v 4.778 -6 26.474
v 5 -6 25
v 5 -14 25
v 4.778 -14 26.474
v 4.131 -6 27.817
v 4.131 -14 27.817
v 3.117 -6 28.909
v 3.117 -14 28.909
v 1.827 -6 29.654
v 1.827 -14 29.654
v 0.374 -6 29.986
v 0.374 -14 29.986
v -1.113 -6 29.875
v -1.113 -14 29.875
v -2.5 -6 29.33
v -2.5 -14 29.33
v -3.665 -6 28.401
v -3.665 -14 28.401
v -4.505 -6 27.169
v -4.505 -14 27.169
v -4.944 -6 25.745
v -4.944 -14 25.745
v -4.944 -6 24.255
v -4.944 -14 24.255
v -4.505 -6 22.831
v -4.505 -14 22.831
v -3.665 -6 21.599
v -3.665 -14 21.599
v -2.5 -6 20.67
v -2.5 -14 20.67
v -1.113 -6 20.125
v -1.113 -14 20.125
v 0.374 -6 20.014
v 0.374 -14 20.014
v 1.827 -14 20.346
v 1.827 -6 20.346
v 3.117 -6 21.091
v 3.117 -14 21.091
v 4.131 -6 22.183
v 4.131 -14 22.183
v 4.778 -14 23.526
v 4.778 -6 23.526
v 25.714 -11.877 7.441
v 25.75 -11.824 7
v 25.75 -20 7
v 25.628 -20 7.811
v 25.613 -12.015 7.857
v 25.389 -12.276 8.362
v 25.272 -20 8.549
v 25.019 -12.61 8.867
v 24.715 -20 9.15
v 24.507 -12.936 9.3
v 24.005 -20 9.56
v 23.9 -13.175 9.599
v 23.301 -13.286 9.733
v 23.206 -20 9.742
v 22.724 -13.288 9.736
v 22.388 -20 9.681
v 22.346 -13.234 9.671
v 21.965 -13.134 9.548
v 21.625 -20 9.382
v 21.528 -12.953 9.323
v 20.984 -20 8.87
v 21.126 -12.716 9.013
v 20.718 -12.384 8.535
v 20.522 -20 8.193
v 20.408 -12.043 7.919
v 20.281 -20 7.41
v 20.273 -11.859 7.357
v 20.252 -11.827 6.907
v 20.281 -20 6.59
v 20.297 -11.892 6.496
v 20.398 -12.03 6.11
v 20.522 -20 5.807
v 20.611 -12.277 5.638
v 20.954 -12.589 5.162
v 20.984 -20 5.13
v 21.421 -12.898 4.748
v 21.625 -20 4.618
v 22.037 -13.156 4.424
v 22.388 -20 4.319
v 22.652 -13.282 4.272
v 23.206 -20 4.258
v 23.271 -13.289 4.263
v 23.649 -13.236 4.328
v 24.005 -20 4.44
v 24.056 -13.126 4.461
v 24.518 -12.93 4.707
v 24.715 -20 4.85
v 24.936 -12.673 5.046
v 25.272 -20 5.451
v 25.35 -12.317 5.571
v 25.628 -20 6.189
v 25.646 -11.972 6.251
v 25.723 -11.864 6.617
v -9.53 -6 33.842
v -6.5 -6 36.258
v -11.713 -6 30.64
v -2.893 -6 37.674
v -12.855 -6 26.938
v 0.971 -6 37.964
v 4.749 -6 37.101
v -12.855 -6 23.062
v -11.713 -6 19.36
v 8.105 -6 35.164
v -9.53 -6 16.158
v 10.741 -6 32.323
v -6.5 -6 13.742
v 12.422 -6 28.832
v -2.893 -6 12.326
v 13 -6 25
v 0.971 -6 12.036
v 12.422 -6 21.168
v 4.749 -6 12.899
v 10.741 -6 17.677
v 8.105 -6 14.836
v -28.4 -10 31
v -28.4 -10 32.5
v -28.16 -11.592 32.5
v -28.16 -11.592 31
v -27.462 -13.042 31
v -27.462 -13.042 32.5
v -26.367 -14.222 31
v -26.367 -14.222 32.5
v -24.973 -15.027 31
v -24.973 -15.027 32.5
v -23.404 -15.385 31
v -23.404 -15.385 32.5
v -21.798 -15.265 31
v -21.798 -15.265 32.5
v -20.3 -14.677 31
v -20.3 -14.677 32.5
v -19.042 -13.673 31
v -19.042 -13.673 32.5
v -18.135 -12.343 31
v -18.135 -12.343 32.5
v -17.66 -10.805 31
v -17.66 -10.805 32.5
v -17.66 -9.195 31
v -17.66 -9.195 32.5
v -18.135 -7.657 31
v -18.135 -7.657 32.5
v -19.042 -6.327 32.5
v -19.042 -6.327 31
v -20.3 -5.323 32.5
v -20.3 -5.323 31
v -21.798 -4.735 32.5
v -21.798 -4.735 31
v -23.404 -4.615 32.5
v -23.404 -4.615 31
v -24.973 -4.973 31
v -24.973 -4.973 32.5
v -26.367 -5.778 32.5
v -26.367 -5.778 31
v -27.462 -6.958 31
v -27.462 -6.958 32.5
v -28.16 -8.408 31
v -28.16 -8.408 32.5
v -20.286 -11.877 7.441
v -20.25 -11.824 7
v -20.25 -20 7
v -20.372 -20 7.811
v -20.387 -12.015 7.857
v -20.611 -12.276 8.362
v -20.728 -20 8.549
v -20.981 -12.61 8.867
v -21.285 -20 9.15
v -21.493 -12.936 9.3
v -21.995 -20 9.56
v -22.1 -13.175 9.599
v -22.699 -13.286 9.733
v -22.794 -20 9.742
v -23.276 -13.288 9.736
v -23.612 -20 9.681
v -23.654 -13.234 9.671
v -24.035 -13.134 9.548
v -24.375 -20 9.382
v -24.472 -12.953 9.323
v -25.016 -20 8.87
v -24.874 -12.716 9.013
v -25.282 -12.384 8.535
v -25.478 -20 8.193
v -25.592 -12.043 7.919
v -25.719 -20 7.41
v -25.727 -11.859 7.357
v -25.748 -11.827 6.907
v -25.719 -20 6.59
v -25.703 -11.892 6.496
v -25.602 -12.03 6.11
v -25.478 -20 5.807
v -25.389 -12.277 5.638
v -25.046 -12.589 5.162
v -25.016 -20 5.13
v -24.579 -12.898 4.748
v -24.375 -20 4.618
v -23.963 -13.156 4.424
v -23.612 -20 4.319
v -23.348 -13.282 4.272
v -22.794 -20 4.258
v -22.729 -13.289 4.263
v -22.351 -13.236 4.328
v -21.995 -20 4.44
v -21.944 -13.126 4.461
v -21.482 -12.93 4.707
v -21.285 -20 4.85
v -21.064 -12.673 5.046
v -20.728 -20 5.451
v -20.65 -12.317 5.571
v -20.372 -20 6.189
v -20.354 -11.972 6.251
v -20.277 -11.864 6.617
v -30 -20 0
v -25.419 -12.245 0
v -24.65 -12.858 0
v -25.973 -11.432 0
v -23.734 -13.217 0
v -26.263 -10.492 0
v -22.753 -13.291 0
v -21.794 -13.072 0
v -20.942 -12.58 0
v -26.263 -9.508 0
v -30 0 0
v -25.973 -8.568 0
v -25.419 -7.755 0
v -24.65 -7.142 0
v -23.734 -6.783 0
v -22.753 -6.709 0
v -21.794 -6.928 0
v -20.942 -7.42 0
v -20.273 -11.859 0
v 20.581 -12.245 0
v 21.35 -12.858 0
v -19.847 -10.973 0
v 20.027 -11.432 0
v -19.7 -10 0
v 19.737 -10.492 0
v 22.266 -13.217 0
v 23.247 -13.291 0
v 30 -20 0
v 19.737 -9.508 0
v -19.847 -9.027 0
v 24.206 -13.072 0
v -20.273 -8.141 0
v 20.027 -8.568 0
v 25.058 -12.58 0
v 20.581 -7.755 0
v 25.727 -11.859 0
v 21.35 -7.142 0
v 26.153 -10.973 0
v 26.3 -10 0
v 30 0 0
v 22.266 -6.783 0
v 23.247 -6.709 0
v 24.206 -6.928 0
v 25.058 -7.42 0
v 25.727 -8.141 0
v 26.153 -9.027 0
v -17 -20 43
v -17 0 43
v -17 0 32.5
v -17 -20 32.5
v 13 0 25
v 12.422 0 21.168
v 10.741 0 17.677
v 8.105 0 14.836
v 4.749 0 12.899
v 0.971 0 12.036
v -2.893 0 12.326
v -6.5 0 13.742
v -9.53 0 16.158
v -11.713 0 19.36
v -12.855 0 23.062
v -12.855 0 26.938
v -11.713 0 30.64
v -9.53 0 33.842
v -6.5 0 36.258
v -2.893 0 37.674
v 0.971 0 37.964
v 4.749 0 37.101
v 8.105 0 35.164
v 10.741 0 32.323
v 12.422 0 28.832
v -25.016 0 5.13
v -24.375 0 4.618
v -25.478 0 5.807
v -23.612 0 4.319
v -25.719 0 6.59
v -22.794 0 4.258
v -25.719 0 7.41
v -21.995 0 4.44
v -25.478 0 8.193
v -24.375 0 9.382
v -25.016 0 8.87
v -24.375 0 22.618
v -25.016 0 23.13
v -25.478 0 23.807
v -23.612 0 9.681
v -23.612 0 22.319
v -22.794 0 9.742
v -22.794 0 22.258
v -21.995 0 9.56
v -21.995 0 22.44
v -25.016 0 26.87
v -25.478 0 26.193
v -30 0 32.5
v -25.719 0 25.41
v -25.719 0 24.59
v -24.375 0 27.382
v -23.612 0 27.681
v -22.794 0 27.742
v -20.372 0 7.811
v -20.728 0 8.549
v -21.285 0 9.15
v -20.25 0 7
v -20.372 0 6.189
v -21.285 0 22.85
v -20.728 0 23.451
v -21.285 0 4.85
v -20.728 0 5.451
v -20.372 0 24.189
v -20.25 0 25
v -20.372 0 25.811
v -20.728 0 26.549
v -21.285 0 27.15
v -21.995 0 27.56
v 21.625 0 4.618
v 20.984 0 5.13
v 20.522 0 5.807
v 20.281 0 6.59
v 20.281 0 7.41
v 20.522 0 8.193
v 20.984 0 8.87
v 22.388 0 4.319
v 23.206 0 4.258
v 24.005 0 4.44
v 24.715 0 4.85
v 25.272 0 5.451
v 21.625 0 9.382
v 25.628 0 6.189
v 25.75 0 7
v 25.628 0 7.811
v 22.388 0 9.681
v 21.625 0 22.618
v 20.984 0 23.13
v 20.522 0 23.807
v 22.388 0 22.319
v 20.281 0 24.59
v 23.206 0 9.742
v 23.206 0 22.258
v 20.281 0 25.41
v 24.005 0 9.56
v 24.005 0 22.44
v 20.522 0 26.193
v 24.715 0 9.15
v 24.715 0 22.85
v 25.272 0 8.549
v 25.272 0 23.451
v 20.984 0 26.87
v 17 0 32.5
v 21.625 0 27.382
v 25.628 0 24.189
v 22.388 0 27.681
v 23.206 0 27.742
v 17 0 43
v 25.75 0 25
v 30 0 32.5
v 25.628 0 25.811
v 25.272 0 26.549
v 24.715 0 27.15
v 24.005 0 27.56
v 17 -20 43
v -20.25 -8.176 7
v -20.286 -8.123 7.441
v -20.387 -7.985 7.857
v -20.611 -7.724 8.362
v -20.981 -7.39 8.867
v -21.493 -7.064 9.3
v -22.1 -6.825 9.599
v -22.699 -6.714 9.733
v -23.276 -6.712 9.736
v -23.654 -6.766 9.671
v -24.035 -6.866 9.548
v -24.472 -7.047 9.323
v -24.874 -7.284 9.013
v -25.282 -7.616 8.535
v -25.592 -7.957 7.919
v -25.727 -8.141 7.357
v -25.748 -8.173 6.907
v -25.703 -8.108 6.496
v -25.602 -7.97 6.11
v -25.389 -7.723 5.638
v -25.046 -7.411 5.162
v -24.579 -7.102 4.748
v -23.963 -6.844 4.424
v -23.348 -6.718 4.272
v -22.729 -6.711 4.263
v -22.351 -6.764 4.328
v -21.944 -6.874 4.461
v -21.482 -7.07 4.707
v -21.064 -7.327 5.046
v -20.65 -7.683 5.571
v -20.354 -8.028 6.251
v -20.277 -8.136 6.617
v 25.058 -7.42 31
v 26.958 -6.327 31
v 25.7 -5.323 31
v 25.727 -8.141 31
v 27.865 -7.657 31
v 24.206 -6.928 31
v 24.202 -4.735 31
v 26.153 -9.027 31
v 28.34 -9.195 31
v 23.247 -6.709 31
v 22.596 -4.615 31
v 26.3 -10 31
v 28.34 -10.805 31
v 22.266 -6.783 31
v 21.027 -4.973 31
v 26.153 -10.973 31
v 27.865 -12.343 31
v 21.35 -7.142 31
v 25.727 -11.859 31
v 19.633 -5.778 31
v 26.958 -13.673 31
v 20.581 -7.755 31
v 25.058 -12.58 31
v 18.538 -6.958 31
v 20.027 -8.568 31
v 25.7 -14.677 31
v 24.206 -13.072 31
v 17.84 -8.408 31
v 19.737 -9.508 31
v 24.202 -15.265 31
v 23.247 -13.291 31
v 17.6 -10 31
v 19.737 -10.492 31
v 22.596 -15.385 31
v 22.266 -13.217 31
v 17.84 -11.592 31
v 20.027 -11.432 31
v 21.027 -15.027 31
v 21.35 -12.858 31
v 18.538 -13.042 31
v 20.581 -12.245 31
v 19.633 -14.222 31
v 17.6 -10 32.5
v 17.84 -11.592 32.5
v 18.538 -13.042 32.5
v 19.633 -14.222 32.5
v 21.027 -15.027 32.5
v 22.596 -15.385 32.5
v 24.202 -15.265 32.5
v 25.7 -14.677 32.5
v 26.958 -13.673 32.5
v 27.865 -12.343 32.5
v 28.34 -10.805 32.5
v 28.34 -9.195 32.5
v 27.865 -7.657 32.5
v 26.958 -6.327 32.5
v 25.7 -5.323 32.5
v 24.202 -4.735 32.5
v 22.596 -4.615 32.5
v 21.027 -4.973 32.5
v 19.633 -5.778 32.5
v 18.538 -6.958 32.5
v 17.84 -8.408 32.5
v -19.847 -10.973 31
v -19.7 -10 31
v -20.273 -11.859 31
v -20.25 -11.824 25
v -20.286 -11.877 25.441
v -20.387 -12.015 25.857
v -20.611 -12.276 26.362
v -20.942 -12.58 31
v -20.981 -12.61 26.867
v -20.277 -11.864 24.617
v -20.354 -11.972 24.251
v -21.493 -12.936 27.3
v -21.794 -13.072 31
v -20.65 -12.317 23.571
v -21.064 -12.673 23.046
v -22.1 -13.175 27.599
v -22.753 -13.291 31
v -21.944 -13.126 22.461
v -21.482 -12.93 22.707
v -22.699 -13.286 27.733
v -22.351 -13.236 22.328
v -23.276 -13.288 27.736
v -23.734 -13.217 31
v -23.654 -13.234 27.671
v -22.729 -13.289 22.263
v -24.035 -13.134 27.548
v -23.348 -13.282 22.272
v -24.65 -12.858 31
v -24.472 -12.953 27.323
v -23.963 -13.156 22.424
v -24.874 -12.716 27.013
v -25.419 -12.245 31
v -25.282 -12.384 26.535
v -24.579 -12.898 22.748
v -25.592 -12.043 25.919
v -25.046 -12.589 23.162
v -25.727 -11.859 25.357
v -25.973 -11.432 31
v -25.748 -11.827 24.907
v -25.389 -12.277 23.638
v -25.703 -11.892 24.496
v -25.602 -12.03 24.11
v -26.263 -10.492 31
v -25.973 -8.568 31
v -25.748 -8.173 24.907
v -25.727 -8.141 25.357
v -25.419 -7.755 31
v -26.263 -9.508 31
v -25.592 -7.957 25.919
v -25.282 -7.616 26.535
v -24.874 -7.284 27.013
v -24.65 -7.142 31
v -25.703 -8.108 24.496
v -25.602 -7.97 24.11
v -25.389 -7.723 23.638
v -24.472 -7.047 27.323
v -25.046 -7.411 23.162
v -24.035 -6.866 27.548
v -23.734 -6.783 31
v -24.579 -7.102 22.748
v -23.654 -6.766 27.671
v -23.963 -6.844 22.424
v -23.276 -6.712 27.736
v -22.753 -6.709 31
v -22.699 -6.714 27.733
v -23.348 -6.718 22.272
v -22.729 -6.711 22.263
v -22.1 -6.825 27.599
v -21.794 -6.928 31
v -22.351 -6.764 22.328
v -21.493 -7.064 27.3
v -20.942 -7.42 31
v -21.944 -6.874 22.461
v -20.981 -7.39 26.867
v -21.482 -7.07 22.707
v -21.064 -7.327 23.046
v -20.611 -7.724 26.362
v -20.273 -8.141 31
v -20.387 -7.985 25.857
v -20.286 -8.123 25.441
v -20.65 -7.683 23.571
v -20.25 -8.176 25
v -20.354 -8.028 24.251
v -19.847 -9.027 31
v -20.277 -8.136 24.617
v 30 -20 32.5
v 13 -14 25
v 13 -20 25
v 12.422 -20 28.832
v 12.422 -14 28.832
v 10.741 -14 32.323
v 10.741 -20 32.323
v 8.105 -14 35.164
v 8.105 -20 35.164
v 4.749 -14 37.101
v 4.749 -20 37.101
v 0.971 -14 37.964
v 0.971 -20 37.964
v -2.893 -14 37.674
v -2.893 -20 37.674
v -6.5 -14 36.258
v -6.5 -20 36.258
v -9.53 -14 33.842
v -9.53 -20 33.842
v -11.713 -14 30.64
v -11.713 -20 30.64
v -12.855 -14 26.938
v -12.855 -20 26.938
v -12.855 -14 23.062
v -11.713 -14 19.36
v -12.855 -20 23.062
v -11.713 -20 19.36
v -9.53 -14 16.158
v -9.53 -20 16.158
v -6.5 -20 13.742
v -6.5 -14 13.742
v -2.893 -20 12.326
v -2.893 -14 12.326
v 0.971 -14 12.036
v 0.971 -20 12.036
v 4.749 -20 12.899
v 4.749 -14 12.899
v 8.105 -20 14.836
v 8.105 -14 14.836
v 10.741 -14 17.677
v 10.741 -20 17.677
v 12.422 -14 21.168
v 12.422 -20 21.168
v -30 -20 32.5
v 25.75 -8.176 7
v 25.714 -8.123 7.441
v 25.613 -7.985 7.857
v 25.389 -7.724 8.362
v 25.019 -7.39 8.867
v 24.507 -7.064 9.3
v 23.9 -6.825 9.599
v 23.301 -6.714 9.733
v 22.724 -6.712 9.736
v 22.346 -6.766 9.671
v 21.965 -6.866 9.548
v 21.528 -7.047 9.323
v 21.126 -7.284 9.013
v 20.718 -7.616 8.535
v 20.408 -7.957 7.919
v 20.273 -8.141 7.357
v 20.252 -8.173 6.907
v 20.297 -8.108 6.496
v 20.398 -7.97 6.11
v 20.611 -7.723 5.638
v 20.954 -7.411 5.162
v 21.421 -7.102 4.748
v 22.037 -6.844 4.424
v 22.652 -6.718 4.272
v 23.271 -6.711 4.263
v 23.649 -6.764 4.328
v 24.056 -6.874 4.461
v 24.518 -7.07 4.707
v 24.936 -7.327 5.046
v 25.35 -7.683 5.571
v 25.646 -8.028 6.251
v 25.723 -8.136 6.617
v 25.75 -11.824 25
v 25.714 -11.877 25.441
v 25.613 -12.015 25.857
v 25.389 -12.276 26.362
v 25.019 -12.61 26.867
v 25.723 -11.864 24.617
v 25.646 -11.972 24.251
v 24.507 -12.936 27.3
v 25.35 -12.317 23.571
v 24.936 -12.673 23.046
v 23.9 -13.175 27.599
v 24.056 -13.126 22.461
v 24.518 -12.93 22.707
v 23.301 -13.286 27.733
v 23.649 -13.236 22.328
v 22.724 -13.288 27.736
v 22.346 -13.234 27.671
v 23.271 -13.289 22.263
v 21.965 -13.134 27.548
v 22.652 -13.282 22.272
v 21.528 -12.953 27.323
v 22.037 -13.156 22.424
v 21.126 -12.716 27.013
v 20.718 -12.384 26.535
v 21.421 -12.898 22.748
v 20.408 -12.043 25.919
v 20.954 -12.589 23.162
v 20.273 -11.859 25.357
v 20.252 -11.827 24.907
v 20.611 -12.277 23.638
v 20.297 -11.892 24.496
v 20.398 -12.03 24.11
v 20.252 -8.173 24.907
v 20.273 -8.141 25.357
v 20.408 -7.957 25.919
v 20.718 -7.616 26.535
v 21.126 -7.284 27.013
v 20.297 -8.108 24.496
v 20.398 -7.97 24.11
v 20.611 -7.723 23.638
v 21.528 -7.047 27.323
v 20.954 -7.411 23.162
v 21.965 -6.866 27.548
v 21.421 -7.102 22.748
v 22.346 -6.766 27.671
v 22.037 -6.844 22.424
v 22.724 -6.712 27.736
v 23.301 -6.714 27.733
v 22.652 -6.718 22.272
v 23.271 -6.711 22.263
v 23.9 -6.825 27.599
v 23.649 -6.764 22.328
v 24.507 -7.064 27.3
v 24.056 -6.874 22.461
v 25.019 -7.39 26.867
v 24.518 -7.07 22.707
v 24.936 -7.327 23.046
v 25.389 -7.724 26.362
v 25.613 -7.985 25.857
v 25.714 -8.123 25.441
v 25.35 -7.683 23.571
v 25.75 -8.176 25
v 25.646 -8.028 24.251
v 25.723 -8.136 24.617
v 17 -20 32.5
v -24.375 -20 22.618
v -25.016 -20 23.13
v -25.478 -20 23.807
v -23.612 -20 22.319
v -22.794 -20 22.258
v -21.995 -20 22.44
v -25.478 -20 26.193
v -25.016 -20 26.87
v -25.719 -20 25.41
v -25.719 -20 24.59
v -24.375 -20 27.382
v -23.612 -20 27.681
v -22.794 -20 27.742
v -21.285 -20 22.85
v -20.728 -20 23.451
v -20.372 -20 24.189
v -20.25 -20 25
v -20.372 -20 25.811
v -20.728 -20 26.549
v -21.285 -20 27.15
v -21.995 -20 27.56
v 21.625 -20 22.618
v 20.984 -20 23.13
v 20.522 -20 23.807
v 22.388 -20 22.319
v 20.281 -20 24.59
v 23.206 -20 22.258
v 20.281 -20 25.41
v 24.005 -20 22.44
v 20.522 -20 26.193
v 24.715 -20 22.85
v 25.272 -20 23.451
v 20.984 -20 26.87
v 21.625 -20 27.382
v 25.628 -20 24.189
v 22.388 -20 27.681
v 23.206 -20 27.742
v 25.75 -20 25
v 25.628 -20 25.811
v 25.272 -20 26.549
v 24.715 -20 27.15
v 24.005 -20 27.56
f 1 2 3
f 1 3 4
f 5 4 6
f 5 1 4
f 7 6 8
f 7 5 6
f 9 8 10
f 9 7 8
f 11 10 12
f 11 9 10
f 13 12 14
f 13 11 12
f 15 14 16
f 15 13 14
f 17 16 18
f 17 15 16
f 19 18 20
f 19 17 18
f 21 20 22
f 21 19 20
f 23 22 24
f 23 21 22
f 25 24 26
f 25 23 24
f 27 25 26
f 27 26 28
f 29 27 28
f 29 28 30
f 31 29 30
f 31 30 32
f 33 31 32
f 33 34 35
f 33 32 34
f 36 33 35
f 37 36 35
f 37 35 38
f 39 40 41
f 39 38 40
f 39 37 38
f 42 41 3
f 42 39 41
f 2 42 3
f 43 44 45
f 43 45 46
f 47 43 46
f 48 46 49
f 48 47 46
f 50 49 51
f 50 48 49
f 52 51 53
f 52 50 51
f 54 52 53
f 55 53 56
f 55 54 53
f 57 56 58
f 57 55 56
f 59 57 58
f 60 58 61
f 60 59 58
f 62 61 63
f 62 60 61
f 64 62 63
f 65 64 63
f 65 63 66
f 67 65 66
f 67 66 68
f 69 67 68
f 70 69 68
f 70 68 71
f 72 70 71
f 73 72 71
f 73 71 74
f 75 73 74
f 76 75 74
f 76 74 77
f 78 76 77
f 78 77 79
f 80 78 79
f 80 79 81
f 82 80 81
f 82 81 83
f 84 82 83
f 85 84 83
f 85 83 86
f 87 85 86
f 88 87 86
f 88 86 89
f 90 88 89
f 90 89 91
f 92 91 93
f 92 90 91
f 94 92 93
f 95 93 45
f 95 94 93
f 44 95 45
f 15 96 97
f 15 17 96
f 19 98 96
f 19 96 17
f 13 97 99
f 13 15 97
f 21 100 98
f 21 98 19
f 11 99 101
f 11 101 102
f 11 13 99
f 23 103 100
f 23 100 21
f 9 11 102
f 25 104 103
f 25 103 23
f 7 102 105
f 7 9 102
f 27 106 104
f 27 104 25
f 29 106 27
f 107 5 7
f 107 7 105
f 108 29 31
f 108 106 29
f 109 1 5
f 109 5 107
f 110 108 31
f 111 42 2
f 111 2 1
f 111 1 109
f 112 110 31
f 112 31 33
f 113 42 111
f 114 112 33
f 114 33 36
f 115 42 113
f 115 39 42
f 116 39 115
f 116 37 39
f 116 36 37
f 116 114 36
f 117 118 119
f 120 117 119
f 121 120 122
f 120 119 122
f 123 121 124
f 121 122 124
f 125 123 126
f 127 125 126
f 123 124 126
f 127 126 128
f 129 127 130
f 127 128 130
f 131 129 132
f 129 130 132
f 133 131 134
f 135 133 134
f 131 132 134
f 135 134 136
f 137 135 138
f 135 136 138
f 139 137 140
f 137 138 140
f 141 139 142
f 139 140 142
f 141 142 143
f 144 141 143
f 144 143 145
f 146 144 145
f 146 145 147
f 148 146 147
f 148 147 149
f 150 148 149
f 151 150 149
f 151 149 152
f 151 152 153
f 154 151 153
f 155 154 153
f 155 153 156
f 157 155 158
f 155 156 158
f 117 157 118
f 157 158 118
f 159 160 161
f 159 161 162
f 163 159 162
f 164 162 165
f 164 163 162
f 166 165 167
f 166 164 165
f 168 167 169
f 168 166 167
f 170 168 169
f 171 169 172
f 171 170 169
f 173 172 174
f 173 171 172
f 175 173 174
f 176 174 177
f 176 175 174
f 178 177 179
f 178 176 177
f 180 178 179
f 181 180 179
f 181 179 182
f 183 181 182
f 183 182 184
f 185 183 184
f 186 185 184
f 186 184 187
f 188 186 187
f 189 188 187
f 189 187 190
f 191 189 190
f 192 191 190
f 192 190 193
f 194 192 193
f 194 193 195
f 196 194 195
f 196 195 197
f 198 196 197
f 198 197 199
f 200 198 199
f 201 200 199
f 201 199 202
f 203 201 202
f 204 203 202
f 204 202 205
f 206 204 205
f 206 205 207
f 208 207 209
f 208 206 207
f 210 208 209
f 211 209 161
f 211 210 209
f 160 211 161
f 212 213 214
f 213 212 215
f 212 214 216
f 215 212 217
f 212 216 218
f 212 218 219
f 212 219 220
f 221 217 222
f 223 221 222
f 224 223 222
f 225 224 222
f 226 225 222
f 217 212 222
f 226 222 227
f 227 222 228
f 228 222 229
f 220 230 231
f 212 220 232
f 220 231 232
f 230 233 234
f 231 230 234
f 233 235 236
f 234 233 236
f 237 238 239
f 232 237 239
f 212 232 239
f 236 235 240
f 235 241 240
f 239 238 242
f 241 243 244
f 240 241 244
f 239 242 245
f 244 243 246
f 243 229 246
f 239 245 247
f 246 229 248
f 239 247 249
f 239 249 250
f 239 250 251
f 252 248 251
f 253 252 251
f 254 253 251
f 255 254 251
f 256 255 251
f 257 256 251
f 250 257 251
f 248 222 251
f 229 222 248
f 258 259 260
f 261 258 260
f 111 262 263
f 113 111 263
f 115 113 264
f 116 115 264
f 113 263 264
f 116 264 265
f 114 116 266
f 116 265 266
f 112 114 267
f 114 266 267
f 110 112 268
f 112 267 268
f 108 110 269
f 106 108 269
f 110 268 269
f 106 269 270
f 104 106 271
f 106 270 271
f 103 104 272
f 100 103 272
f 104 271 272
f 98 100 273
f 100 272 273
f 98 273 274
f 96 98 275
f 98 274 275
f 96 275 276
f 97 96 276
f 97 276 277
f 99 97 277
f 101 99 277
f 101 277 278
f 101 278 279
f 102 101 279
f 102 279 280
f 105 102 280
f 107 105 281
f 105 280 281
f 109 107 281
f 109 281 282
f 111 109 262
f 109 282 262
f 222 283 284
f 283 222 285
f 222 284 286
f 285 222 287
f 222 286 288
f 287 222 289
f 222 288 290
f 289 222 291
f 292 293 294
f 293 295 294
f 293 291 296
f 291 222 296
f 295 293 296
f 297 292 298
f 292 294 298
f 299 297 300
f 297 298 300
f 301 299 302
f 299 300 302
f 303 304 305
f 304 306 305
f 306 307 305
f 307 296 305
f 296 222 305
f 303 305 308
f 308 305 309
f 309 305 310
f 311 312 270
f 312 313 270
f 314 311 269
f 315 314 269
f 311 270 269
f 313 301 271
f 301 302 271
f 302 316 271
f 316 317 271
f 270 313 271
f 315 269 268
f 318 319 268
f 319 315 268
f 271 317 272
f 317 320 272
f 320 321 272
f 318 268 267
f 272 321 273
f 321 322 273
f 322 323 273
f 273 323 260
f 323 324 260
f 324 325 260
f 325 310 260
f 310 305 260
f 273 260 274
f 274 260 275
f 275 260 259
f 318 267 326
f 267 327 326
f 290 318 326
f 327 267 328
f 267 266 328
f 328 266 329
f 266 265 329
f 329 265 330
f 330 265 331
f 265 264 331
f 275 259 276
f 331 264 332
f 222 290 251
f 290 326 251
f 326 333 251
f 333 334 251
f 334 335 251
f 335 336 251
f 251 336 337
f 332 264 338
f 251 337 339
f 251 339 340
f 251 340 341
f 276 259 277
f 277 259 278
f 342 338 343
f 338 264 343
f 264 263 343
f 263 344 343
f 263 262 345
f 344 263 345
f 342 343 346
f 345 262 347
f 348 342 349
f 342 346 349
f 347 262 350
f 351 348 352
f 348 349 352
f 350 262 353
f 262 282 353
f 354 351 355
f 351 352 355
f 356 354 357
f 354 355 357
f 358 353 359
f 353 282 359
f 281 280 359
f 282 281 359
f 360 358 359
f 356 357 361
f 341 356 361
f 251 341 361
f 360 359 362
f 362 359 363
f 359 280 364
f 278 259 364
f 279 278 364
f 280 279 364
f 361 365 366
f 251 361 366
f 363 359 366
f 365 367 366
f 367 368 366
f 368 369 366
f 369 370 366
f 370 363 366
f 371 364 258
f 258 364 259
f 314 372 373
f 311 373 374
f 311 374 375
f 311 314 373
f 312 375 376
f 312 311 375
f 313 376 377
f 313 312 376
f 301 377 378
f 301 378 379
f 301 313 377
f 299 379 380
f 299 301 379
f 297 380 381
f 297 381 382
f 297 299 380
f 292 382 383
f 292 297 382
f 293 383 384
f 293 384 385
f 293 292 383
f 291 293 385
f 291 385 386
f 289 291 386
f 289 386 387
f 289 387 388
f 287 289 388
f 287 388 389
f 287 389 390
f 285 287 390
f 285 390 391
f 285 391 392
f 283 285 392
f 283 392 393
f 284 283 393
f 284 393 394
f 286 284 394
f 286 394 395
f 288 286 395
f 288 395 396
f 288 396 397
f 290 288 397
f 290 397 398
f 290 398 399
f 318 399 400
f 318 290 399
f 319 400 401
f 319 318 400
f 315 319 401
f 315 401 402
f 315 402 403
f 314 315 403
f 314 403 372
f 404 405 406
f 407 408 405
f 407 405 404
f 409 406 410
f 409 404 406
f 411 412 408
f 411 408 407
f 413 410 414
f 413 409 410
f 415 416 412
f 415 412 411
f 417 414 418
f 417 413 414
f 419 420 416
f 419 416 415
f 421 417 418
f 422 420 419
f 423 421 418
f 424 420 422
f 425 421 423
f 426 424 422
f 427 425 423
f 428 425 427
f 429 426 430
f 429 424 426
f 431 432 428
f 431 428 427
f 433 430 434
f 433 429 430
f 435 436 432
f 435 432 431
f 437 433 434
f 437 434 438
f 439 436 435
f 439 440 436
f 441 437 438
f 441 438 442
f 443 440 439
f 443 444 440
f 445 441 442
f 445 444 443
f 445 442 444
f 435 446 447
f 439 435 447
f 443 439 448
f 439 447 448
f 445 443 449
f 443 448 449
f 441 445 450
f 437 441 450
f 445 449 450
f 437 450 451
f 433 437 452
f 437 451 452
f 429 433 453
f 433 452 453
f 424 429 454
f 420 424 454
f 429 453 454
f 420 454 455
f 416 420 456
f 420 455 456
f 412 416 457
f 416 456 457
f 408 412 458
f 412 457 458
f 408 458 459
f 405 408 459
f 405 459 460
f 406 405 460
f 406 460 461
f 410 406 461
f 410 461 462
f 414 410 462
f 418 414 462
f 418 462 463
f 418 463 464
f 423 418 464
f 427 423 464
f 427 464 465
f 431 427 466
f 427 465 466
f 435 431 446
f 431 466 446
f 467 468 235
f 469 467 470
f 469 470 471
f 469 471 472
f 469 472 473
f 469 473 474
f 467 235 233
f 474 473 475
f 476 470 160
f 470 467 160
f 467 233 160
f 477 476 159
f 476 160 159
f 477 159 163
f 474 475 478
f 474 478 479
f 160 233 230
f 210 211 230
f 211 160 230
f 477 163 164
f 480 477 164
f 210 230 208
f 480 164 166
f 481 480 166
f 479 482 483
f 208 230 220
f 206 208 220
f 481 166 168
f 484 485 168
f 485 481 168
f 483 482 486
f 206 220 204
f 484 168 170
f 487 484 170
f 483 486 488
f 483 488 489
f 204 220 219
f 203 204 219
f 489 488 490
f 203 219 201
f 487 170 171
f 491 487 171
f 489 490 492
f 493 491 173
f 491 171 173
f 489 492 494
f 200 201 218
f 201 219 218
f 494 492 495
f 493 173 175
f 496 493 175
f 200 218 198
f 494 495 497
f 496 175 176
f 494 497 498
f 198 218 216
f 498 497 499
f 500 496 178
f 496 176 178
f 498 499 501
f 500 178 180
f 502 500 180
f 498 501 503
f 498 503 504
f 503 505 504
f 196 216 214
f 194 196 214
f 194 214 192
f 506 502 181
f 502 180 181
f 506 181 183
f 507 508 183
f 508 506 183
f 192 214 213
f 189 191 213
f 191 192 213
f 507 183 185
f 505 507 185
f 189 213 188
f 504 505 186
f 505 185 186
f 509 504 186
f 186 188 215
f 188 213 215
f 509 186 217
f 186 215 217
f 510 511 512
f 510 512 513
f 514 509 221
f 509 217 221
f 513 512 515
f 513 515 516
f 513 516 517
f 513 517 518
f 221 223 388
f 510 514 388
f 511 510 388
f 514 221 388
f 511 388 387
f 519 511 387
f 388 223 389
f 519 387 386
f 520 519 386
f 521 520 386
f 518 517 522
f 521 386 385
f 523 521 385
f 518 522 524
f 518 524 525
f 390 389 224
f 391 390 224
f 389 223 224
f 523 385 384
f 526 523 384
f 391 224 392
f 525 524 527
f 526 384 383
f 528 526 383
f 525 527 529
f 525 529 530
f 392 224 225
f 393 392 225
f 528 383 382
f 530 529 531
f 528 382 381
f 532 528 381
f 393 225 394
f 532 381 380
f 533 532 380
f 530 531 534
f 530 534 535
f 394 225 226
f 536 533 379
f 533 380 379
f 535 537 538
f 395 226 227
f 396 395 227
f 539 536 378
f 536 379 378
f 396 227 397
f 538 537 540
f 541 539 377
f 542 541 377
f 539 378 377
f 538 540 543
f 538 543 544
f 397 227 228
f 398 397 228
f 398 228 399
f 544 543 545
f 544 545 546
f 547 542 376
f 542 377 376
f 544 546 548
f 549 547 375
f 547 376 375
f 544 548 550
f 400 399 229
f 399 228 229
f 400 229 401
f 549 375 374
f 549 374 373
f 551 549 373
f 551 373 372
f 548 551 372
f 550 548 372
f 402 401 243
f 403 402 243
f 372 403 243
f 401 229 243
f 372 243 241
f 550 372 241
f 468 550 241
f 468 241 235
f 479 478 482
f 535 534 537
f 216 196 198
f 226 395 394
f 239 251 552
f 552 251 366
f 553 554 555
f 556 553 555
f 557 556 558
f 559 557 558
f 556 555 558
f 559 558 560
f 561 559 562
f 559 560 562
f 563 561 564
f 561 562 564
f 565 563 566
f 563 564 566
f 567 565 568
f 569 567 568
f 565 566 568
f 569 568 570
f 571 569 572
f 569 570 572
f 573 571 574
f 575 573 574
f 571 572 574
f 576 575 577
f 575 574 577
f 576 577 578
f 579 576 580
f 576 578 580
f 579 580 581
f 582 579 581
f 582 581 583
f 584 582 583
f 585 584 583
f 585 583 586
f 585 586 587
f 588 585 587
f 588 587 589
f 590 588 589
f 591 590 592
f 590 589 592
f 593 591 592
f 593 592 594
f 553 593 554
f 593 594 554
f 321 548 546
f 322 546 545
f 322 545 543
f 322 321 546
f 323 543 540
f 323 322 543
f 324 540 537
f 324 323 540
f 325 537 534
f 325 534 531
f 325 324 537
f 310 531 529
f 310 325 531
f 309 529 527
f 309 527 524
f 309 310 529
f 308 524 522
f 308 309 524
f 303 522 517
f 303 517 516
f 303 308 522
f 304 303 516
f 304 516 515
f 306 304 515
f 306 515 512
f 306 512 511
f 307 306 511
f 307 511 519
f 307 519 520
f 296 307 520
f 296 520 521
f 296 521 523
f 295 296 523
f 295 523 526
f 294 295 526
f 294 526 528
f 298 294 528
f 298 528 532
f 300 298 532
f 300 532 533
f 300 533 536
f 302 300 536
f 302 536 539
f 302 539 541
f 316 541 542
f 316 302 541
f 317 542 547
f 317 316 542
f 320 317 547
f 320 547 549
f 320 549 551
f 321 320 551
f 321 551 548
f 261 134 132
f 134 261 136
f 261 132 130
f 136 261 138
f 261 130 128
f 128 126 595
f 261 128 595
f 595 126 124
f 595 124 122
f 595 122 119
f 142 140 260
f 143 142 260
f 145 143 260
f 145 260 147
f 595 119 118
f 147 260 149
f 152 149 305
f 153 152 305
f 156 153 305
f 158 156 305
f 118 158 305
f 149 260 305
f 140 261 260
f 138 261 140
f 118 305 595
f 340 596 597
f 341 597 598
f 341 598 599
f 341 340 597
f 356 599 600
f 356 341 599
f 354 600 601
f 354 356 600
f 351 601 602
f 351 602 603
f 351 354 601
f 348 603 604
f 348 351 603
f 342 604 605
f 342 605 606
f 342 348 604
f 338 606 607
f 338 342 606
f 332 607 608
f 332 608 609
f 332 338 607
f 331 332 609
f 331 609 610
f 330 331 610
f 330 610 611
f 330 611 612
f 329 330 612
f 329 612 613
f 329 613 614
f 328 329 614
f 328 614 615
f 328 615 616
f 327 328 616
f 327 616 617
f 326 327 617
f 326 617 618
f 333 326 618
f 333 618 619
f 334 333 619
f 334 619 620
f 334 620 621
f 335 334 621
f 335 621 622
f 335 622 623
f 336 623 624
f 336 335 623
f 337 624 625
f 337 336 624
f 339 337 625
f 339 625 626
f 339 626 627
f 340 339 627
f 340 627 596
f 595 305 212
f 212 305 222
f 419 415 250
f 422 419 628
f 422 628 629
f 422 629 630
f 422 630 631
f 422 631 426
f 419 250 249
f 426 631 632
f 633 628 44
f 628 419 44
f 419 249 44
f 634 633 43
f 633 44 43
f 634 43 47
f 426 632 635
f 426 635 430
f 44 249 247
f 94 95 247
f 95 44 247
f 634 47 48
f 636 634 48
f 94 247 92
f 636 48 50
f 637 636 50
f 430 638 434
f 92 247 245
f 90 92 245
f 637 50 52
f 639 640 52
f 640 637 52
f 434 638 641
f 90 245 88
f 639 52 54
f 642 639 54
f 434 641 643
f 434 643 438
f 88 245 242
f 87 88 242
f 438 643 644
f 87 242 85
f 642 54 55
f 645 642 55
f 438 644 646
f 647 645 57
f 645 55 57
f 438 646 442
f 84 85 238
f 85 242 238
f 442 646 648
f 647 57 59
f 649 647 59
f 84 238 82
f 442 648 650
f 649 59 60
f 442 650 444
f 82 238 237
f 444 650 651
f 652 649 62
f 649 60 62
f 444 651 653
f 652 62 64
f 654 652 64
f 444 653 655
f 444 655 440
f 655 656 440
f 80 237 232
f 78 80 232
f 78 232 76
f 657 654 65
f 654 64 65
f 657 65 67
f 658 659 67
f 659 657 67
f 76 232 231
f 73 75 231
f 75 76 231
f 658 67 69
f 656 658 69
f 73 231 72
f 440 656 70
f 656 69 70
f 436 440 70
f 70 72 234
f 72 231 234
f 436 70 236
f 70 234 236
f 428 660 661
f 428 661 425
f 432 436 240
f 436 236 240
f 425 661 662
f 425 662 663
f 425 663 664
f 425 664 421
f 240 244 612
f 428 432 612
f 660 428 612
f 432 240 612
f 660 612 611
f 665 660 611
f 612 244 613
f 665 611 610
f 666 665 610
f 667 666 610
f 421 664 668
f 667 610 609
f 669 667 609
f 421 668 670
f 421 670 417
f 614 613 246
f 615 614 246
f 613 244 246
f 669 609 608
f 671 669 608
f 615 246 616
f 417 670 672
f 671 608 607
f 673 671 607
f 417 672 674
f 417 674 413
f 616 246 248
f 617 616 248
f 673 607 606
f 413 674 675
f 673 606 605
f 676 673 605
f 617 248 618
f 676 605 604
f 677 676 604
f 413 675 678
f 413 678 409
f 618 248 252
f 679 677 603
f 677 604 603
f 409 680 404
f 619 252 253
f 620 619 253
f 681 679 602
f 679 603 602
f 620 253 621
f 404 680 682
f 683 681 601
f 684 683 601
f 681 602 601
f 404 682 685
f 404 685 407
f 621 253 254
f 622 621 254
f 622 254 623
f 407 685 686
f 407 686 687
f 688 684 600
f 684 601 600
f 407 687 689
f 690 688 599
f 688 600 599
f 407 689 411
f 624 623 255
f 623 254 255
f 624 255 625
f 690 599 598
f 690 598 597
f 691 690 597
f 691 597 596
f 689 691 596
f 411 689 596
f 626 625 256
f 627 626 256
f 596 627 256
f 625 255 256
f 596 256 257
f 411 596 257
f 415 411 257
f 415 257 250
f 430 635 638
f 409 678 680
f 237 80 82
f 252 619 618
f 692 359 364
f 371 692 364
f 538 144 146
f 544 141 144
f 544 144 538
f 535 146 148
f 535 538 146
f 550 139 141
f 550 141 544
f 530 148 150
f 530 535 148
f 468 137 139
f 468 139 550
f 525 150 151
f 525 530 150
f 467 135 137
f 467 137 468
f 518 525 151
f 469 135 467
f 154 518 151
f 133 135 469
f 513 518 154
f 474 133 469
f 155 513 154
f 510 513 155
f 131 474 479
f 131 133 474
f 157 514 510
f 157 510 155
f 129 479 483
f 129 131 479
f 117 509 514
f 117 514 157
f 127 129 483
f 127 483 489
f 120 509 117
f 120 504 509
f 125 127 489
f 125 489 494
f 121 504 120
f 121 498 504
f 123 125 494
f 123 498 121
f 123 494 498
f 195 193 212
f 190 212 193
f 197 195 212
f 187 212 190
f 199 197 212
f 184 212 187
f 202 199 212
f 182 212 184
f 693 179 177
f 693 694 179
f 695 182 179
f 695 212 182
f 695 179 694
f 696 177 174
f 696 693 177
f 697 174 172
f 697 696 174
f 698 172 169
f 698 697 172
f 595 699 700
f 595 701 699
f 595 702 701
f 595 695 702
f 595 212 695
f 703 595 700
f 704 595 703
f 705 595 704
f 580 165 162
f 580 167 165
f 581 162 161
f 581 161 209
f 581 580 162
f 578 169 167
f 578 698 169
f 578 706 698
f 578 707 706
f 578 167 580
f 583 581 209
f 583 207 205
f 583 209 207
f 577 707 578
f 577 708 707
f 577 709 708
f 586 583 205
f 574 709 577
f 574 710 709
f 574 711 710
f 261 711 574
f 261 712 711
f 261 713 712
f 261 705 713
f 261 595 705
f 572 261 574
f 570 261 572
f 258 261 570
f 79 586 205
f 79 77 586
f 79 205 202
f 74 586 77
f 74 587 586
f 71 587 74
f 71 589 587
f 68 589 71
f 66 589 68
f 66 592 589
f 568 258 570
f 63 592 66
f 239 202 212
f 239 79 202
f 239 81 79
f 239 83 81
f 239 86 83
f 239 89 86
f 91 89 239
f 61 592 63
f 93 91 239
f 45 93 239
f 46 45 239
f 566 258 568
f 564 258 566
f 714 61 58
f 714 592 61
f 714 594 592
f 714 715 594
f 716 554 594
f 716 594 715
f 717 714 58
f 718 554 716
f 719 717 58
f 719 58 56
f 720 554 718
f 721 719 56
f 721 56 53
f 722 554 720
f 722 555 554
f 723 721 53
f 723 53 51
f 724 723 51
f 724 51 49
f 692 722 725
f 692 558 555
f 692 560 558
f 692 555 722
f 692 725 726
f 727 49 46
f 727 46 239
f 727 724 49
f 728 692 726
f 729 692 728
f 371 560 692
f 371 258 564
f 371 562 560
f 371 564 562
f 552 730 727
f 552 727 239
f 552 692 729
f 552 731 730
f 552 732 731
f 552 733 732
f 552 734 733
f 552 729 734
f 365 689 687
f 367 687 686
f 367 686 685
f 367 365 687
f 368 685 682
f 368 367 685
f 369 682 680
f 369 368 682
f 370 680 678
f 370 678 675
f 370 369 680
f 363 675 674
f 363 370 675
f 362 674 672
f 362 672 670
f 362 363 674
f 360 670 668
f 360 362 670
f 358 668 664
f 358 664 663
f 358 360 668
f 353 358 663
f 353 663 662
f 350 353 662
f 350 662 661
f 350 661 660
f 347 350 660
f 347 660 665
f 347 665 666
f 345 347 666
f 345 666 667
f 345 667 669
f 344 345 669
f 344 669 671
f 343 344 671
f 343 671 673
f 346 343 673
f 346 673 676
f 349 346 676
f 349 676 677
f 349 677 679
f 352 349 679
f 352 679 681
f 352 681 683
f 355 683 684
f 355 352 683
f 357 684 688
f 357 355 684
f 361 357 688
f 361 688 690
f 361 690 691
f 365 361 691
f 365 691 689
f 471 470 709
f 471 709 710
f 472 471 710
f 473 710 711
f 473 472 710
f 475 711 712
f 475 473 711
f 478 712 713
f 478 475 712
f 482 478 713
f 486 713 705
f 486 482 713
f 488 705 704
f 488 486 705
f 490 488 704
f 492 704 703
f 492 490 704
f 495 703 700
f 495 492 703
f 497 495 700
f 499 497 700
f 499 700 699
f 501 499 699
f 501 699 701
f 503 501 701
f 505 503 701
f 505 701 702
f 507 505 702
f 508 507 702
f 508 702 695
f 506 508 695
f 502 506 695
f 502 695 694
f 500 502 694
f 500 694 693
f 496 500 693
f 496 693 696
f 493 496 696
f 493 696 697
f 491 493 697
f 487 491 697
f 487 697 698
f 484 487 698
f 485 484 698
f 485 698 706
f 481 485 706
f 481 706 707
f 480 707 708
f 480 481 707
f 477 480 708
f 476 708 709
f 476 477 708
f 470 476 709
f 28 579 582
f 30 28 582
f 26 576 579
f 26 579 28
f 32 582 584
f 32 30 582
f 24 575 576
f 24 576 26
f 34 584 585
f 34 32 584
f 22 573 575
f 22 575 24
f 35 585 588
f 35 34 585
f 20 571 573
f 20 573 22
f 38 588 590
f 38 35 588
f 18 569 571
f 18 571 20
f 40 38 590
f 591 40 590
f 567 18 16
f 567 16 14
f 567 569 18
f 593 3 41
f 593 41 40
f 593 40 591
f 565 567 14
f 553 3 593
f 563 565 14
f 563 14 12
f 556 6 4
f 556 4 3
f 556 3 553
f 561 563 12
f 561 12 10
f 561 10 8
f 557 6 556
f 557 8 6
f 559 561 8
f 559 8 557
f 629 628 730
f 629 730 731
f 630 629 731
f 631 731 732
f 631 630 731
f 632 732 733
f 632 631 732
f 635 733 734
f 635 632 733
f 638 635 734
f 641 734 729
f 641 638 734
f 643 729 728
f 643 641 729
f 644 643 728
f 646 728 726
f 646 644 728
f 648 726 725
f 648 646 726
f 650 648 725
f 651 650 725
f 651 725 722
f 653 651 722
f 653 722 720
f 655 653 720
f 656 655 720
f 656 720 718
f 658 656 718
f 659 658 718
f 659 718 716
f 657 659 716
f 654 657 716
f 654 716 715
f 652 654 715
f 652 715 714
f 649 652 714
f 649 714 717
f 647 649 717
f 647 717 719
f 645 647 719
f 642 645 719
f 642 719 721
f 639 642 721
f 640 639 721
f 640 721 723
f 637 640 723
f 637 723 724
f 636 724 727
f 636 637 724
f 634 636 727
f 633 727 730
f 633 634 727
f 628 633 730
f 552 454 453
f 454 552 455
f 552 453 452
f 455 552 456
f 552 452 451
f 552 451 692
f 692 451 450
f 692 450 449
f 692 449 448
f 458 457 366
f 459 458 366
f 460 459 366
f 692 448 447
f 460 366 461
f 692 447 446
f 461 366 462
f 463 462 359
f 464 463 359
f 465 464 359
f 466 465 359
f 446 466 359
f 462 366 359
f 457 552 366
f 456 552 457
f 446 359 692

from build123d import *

# Parameters (mm, degrees)
SKETCH_R        = 5
SKETCH_R_2      = 2.75
PAD_DEPTH       = 20
SKETCH001_R     = 3.3
POCKET_DEPTH    = 43.001
SKETCH002_R     = 5.4
POCKET001_DEPTH = 1.5
SKETCH003_R     = 13
POCKET002_DEPTH = 6
SKETCH004_R     = 13
POCKET003_DEPTH = 6


with BuildPart() as part:
    # Sketch → Pad (new body)
    with BuildSketch(Plane.XZ):
        Polygon((-30, 0), (30, 0), (30, 32.5), (17, 32.5), (17, 43), (-17, 43), (-17, 32.5), (-30, 32.5), align=None)
        with Locations((0, 25)):
            Circle(SKETCH_R, mode=Mode.SUBTRACT)
        with Locations((-23, 25)):
            Circle(SKETCH_R_2, mode=Mode.SUBTRACT)
        with Locations((-23, 7)):
            Circle(SKETCH_R_2, mode=Mode.SUBTRACT)
        with Locations((23, 7)):
            Circle(SKETCH_R_2, mode=Mode.SUBTRACT)
        with Locations((23, 25)):
            Circle(SKETCH_R_2, mode=Mode.SUBTRACT)
    extrude(amount=PAD_DEPTH)

    # Sketch001 (on Face1 of Pad) → Pocket (cut, through all)
    with BuildSketch(Plane(origin=(0, 0, 0), x_dir=(1, 0, 0), z_dir=(0, 0, -1))):
        with Locations((-23, 10)):
            Circle(SKETCH001_R)
        with Locations((23, 10)):
            Circle(SKETCH001_R)
    extrude(amount=-POCKET_DEPTH, mode=Mode.SUBTRACT)

    # Sketch002 (on Face9 of Pocket) → Pocket001 (cut)
    with BuildSketch(Plane(origin=(0, 0, 32.5), x_dir=(-1, 0, 0), z_dir=(0, 0, 1))):
        with Locations((-23, 10)):
            Circle(SKETCH002_R)
        with Locations((23, 10)):
            Circle(SKETCH002_R)
    extrude(amount=-POCKET001_DEPTH, mode=Mode.SUBTRACT)

    # Sketch003 (on Face4 of Pocket001) → Pocket002 (cut)
    with BuildSketch(Plane.XZ.offset(20)):
        with Locations((0, 25)):
            Circle(SKETCH003_R)
    extrude(amount=-POCKET002_DEPTH, mode=Mode.SUBTRACT)

    # Sketch004 (on Face3 of Pocket002) → Pocket003 (cut)
    with BuildSketch(Plane(origin=(0, 0, 0), x_dir=(1, 0, 0), z_dir=(0, 1, 0))):
        with Locations((0, -25)):
            Circle(SKETCH004_R)
    extrude(amount=-POCKET003_DEPTH, mode=Mode.SUBTRACT)


solid = part.part
